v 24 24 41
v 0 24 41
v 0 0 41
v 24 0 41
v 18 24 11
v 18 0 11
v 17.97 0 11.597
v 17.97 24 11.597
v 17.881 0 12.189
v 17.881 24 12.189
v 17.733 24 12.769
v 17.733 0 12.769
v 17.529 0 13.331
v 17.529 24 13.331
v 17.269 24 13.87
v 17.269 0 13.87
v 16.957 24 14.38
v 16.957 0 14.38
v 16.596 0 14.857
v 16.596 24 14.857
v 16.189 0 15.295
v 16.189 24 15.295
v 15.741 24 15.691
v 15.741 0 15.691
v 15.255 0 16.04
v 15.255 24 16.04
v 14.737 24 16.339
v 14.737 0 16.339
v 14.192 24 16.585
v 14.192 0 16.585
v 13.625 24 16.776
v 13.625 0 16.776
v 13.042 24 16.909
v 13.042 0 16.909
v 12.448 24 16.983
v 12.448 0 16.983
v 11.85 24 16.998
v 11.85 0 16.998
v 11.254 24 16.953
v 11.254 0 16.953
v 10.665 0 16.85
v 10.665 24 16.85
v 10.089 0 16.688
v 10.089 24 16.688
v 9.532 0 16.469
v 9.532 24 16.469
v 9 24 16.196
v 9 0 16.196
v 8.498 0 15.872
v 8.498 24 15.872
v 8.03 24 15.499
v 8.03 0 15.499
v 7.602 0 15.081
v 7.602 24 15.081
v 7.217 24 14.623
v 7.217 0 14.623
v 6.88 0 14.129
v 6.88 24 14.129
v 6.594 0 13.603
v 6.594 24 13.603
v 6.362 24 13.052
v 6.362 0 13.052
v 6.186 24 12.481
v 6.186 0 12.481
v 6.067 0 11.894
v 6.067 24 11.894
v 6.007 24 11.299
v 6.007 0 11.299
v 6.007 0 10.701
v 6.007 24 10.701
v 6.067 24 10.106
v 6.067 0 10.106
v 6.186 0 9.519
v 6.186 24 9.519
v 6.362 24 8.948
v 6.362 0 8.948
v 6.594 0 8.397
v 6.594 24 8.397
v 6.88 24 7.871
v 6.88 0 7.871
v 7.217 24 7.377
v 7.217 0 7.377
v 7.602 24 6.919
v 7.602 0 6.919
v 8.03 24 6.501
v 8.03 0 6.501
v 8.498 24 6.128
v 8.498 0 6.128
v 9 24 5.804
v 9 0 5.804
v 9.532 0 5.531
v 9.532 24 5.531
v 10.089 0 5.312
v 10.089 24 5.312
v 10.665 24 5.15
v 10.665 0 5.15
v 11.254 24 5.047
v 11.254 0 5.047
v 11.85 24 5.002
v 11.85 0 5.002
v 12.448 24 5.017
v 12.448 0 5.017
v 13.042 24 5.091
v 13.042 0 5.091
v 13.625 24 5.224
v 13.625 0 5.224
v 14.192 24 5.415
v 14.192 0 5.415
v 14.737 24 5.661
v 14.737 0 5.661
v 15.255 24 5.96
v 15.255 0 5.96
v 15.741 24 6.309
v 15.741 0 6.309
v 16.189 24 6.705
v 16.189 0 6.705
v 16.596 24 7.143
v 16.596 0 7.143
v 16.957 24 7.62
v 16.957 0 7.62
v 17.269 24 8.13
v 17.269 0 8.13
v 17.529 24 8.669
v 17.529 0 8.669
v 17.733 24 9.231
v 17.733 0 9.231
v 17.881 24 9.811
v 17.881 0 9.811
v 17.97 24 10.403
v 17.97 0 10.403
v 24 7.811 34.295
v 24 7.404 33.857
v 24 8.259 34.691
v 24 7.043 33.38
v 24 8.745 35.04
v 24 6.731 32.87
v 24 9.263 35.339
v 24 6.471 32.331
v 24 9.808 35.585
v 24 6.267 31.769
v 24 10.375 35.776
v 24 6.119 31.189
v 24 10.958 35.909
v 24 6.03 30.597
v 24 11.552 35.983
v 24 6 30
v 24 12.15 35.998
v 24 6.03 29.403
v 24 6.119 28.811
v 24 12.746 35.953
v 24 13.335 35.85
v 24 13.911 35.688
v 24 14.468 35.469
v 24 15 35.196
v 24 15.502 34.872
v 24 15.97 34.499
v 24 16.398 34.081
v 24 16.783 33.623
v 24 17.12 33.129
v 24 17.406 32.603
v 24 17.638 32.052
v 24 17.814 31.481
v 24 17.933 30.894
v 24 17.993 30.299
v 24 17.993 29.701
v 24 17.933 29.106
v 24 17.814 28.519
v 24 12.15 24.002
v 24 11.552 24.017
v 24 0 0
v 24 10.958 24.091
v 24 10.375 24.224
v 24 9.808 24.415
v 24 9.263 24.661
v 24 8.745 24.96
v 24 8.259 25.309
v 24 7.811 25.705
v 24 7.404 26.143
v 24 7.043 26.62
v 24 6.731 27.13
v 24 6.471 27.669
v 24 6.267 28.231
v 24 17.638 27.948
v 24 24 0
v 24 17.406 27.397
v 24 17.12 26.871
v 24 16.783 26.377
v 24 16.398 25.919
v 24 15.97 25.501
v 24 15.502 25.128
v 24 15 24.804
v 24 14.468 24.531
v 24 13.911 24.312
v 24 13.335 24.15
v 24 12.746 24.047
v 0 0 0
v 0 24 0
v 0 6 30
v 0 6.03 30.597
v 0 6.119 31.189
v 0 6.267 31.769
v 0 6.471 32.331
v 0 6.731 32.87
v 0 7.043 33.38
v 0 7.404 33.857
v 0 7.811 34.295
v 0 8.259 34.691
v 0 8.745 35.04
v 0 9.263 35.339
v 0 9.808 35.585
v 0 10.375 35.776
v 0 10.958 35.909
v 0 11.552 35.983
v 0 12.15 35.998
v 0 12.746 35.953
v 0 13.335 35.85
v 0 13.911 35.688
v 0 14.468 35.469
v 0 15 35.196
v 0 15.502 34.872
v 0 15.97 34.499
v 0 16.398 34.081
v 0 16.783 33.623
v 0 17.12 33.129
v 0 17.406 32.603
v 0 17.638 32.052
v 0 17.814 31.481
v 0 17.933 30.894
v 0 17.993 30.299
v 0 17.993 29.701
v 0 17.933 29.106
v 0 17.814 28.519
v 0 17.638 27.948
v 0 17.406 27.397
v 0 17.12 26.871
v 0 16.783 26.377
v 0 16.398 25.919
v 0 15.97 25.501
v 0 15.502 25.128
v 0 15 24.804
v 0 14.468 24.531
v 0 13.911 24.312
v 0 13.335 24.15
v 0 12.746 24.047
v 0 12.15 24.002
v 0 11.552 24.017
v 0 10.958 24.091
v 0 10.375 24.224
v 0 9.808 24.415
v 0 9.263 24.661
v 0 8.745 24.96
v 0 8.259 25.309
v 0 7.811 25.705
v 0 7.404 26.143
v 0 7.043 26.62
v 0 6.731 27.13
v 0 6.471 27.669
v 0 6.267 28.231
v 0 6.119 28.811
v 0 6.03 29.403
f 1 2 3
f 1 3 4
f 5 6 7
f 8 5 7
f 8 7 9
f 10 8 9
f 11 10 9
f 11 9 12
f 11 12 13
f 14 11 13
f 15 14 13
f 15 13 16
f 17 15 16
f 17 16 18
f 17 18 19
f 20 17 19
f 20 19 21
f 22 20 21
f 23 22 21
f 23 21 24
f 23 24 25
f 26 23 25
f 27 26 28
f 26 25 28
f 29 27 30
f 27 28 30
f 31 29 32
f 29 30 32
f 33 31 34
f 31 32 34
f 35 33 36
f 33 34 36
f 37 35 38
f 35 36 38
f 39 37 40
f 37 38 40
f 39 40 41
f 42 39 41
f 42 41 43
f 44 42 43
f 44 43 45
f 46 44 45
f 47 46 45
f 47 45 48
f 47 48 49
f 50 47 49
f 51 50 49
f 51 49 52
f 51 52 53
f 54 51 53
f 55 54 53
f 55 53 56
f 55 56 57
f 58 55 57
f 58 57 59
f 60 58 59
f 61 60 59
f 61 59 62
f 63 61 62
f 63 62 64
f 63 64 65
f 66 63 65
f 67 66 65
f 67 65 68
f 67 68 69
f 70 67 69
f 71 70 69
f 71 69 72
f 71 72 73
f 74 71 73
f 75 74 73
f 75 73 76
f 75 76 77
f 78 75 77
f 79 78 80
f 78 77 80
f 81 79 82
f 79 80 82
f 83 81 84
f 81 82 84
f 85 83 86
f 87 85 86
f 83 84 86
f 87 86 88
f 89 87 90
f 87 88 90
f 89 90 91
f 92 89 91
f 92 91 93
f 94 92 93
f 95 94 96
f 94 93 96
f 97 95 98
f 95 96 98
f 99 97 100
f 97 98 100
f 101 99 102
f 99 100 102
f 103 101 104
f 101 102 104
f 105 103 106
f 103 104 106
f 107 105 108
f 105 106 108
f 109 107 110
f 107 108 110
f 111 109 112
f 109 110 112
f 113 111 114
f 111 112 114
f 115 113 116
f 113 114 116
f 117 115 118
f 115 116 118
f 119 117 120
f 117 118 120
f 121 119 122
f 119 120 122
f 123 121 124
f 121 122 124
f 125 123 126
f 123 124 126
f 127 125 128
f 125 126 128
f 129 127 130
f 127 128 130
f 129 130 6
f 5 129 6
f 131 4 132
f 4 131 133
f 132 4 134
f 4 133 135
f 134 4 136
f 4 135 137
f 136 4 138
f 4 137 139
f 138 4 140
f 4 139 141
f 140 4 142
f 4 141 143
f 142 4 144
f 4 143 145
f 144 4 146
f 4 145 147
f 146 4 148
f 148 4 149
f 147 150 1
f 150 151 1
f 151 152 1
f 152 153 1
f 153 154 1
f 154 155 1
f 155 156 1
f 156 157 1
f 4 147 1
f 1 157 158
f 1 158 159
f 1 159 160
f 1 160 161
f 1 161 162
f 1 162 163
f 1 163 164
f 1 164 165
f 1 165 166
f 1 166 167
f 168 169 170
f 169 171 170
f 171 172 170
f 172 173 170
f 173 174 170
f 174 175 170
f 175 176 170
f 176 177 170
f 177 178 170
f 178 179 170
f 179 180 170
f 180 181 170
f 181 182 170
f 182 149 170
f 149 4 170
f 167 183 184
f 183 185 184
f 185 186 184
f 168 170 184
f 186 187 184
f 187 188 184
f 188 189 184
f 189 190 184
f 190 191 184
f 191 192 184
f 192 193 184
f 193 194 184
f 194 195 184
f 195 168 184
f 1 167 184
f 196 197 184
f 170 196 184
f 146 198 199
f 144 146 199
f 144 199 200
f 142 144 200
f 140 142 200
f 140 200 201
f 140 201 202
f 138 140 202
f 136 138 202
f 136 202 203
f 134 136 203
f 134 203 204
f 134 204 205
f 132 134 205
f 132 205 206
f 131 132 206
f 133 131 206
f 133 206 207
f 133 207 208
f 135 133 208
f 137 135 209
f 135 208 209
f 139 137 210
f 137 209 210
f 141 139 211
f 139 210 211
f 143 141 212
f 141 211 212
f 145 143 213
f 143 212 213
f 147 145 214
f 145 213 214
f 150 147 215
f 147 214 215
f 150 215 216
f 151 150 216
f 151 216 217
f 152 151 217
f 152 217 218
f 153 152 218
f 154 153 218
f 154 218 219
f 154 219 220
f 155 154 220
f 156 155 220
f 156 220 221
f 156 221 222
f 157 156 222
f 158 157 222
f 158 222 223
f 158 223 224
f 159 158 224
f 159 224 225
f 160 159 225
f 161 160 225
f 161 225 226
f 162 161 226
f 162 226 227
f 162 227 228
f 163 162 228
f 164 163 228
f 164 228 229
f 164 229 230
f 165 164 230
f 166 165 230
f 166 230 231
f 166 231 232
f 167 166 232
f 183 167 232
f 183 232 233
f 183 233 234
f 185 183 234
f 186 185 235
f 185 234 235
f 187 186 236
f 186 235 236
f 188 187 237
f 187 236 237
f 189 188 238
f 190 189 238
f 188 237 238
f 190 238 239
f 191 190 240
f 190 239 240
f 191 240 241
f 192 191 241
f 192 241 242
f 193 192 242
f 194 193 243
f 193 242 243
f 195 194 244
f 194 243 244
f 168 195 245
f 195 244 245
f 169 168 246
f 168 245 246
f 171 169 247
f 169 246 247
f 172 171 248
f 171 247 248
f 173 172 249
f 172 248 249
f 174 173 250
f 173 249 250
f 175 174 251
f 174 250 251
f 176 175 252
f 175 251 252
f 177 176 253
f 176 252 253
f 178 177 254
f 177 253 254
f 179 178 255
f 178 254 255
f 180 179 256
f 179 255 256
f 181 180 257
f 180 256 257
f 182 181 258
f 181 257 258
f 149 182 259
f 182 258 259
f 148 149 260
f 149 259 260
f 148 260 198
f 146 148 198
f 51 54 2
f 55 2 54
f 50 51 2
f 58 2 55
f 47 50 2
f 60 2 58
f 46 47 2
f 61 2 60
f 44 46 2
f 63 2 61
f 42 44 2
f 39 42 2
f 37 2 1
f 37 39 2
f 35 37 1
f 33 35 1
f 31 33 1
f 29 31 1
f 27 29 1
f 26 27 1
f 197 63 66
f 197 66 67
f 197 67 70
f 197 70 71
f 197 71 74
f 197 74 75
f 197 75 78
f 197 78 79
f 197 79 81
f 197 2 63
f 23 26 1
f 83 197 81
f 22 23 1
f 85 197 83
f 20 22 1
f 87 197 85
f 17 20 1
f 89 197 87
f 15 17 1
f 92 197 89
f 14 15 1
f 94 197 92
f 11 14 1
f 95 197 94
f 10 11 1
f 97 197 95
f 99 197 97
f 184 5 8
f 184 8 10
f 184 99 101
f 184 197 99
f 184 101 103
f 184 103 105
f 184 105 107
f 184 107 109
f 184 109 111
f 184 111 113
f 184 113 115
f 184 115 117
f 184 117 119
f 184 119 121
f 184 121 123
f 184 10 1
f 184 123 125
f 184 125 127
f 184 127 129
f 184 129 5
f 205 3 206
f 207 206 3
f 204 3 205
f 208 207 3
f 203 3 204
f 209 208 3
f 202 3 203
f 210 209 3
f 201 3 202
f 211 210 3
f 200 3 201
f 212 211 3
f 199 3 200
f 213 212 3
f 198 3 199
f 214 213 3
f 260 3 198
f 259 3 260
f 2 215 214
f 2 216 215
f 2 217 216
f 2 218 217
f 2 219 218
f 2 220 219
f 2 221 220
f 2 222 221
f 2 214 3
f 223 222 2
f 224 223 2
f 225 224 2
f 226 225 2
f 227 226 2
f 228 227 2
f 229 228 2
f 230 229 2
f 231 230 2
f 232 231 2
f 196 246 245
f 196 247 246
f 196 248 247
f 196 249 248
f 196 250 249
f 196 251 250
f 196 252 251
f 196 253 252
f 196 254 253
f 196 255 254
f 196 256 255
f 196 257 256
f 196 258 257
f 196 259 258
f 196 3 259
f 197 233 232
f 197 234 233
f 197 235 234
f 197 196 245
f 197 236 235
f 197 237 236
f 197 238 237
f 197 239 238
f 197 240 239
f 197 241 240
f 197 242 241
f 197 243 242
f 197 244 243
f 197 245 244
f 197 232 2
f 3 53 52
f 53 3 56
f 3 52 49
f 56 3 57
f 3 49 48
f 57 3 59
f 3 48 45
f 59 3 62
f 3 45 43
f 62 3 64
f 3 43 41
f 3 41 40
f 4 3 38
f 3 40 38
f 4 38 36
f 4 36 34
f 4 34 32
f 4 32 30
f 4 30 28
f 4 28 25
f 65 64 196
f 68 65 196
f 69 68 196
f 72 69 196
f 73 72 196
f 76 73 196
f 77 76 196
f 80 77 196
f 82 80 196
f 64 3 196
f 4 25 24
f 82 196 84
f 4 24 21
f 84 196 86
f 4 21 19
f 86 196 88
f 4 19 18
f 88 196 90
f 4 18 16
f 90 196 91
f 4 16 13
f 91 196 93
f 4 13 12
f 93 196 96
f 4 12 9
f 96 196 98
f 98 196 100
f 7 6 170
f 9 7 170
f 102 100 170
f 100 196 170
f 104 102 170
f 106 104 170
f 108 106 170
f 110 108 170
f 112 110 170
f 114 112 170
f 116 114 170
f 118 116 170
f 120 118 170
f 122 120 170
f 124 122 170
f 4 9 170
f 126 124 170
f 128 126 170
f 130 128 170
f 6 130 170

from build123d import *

# Parameters (mm, degrees)
F0_W     = 24
F0_H     = 24
F1_DEPTH = 41
F2_R     = 6
F3_DEPTH = 25
F4_R     = 6
F5_DEPTH = 25


with BuildPart() as f1:
    # F0 (on Top) → F1 (new body)
    with BuildSketch(Plane.XY):
        with Locations((12, 12)):
            Rectangle(F0_W, F0_H)
    extrude(amount=F1_DEPTH)

    # F2 (on face) → F3 (cut)
    with BuildSketch(Plane.XZ):
        with Locations((12, 11)):
            Circle(F2_R)
    extrude(amount=-F3_DEPTH, mode=Mode.SUBTRACT)

    # F4 (on face) → F5 (cut)
    with BuildSketch(Plane(origin=(0, 0, 0), x_dir=(0, -1, 0), z_dir=(-1, 0, 0))):
        with Locations((-12, 30)):
            Circle(F4_R)
    extrude(amount=-F5_DEPTH, mode=Mode.SUBTRACT)


solid = f1.part
